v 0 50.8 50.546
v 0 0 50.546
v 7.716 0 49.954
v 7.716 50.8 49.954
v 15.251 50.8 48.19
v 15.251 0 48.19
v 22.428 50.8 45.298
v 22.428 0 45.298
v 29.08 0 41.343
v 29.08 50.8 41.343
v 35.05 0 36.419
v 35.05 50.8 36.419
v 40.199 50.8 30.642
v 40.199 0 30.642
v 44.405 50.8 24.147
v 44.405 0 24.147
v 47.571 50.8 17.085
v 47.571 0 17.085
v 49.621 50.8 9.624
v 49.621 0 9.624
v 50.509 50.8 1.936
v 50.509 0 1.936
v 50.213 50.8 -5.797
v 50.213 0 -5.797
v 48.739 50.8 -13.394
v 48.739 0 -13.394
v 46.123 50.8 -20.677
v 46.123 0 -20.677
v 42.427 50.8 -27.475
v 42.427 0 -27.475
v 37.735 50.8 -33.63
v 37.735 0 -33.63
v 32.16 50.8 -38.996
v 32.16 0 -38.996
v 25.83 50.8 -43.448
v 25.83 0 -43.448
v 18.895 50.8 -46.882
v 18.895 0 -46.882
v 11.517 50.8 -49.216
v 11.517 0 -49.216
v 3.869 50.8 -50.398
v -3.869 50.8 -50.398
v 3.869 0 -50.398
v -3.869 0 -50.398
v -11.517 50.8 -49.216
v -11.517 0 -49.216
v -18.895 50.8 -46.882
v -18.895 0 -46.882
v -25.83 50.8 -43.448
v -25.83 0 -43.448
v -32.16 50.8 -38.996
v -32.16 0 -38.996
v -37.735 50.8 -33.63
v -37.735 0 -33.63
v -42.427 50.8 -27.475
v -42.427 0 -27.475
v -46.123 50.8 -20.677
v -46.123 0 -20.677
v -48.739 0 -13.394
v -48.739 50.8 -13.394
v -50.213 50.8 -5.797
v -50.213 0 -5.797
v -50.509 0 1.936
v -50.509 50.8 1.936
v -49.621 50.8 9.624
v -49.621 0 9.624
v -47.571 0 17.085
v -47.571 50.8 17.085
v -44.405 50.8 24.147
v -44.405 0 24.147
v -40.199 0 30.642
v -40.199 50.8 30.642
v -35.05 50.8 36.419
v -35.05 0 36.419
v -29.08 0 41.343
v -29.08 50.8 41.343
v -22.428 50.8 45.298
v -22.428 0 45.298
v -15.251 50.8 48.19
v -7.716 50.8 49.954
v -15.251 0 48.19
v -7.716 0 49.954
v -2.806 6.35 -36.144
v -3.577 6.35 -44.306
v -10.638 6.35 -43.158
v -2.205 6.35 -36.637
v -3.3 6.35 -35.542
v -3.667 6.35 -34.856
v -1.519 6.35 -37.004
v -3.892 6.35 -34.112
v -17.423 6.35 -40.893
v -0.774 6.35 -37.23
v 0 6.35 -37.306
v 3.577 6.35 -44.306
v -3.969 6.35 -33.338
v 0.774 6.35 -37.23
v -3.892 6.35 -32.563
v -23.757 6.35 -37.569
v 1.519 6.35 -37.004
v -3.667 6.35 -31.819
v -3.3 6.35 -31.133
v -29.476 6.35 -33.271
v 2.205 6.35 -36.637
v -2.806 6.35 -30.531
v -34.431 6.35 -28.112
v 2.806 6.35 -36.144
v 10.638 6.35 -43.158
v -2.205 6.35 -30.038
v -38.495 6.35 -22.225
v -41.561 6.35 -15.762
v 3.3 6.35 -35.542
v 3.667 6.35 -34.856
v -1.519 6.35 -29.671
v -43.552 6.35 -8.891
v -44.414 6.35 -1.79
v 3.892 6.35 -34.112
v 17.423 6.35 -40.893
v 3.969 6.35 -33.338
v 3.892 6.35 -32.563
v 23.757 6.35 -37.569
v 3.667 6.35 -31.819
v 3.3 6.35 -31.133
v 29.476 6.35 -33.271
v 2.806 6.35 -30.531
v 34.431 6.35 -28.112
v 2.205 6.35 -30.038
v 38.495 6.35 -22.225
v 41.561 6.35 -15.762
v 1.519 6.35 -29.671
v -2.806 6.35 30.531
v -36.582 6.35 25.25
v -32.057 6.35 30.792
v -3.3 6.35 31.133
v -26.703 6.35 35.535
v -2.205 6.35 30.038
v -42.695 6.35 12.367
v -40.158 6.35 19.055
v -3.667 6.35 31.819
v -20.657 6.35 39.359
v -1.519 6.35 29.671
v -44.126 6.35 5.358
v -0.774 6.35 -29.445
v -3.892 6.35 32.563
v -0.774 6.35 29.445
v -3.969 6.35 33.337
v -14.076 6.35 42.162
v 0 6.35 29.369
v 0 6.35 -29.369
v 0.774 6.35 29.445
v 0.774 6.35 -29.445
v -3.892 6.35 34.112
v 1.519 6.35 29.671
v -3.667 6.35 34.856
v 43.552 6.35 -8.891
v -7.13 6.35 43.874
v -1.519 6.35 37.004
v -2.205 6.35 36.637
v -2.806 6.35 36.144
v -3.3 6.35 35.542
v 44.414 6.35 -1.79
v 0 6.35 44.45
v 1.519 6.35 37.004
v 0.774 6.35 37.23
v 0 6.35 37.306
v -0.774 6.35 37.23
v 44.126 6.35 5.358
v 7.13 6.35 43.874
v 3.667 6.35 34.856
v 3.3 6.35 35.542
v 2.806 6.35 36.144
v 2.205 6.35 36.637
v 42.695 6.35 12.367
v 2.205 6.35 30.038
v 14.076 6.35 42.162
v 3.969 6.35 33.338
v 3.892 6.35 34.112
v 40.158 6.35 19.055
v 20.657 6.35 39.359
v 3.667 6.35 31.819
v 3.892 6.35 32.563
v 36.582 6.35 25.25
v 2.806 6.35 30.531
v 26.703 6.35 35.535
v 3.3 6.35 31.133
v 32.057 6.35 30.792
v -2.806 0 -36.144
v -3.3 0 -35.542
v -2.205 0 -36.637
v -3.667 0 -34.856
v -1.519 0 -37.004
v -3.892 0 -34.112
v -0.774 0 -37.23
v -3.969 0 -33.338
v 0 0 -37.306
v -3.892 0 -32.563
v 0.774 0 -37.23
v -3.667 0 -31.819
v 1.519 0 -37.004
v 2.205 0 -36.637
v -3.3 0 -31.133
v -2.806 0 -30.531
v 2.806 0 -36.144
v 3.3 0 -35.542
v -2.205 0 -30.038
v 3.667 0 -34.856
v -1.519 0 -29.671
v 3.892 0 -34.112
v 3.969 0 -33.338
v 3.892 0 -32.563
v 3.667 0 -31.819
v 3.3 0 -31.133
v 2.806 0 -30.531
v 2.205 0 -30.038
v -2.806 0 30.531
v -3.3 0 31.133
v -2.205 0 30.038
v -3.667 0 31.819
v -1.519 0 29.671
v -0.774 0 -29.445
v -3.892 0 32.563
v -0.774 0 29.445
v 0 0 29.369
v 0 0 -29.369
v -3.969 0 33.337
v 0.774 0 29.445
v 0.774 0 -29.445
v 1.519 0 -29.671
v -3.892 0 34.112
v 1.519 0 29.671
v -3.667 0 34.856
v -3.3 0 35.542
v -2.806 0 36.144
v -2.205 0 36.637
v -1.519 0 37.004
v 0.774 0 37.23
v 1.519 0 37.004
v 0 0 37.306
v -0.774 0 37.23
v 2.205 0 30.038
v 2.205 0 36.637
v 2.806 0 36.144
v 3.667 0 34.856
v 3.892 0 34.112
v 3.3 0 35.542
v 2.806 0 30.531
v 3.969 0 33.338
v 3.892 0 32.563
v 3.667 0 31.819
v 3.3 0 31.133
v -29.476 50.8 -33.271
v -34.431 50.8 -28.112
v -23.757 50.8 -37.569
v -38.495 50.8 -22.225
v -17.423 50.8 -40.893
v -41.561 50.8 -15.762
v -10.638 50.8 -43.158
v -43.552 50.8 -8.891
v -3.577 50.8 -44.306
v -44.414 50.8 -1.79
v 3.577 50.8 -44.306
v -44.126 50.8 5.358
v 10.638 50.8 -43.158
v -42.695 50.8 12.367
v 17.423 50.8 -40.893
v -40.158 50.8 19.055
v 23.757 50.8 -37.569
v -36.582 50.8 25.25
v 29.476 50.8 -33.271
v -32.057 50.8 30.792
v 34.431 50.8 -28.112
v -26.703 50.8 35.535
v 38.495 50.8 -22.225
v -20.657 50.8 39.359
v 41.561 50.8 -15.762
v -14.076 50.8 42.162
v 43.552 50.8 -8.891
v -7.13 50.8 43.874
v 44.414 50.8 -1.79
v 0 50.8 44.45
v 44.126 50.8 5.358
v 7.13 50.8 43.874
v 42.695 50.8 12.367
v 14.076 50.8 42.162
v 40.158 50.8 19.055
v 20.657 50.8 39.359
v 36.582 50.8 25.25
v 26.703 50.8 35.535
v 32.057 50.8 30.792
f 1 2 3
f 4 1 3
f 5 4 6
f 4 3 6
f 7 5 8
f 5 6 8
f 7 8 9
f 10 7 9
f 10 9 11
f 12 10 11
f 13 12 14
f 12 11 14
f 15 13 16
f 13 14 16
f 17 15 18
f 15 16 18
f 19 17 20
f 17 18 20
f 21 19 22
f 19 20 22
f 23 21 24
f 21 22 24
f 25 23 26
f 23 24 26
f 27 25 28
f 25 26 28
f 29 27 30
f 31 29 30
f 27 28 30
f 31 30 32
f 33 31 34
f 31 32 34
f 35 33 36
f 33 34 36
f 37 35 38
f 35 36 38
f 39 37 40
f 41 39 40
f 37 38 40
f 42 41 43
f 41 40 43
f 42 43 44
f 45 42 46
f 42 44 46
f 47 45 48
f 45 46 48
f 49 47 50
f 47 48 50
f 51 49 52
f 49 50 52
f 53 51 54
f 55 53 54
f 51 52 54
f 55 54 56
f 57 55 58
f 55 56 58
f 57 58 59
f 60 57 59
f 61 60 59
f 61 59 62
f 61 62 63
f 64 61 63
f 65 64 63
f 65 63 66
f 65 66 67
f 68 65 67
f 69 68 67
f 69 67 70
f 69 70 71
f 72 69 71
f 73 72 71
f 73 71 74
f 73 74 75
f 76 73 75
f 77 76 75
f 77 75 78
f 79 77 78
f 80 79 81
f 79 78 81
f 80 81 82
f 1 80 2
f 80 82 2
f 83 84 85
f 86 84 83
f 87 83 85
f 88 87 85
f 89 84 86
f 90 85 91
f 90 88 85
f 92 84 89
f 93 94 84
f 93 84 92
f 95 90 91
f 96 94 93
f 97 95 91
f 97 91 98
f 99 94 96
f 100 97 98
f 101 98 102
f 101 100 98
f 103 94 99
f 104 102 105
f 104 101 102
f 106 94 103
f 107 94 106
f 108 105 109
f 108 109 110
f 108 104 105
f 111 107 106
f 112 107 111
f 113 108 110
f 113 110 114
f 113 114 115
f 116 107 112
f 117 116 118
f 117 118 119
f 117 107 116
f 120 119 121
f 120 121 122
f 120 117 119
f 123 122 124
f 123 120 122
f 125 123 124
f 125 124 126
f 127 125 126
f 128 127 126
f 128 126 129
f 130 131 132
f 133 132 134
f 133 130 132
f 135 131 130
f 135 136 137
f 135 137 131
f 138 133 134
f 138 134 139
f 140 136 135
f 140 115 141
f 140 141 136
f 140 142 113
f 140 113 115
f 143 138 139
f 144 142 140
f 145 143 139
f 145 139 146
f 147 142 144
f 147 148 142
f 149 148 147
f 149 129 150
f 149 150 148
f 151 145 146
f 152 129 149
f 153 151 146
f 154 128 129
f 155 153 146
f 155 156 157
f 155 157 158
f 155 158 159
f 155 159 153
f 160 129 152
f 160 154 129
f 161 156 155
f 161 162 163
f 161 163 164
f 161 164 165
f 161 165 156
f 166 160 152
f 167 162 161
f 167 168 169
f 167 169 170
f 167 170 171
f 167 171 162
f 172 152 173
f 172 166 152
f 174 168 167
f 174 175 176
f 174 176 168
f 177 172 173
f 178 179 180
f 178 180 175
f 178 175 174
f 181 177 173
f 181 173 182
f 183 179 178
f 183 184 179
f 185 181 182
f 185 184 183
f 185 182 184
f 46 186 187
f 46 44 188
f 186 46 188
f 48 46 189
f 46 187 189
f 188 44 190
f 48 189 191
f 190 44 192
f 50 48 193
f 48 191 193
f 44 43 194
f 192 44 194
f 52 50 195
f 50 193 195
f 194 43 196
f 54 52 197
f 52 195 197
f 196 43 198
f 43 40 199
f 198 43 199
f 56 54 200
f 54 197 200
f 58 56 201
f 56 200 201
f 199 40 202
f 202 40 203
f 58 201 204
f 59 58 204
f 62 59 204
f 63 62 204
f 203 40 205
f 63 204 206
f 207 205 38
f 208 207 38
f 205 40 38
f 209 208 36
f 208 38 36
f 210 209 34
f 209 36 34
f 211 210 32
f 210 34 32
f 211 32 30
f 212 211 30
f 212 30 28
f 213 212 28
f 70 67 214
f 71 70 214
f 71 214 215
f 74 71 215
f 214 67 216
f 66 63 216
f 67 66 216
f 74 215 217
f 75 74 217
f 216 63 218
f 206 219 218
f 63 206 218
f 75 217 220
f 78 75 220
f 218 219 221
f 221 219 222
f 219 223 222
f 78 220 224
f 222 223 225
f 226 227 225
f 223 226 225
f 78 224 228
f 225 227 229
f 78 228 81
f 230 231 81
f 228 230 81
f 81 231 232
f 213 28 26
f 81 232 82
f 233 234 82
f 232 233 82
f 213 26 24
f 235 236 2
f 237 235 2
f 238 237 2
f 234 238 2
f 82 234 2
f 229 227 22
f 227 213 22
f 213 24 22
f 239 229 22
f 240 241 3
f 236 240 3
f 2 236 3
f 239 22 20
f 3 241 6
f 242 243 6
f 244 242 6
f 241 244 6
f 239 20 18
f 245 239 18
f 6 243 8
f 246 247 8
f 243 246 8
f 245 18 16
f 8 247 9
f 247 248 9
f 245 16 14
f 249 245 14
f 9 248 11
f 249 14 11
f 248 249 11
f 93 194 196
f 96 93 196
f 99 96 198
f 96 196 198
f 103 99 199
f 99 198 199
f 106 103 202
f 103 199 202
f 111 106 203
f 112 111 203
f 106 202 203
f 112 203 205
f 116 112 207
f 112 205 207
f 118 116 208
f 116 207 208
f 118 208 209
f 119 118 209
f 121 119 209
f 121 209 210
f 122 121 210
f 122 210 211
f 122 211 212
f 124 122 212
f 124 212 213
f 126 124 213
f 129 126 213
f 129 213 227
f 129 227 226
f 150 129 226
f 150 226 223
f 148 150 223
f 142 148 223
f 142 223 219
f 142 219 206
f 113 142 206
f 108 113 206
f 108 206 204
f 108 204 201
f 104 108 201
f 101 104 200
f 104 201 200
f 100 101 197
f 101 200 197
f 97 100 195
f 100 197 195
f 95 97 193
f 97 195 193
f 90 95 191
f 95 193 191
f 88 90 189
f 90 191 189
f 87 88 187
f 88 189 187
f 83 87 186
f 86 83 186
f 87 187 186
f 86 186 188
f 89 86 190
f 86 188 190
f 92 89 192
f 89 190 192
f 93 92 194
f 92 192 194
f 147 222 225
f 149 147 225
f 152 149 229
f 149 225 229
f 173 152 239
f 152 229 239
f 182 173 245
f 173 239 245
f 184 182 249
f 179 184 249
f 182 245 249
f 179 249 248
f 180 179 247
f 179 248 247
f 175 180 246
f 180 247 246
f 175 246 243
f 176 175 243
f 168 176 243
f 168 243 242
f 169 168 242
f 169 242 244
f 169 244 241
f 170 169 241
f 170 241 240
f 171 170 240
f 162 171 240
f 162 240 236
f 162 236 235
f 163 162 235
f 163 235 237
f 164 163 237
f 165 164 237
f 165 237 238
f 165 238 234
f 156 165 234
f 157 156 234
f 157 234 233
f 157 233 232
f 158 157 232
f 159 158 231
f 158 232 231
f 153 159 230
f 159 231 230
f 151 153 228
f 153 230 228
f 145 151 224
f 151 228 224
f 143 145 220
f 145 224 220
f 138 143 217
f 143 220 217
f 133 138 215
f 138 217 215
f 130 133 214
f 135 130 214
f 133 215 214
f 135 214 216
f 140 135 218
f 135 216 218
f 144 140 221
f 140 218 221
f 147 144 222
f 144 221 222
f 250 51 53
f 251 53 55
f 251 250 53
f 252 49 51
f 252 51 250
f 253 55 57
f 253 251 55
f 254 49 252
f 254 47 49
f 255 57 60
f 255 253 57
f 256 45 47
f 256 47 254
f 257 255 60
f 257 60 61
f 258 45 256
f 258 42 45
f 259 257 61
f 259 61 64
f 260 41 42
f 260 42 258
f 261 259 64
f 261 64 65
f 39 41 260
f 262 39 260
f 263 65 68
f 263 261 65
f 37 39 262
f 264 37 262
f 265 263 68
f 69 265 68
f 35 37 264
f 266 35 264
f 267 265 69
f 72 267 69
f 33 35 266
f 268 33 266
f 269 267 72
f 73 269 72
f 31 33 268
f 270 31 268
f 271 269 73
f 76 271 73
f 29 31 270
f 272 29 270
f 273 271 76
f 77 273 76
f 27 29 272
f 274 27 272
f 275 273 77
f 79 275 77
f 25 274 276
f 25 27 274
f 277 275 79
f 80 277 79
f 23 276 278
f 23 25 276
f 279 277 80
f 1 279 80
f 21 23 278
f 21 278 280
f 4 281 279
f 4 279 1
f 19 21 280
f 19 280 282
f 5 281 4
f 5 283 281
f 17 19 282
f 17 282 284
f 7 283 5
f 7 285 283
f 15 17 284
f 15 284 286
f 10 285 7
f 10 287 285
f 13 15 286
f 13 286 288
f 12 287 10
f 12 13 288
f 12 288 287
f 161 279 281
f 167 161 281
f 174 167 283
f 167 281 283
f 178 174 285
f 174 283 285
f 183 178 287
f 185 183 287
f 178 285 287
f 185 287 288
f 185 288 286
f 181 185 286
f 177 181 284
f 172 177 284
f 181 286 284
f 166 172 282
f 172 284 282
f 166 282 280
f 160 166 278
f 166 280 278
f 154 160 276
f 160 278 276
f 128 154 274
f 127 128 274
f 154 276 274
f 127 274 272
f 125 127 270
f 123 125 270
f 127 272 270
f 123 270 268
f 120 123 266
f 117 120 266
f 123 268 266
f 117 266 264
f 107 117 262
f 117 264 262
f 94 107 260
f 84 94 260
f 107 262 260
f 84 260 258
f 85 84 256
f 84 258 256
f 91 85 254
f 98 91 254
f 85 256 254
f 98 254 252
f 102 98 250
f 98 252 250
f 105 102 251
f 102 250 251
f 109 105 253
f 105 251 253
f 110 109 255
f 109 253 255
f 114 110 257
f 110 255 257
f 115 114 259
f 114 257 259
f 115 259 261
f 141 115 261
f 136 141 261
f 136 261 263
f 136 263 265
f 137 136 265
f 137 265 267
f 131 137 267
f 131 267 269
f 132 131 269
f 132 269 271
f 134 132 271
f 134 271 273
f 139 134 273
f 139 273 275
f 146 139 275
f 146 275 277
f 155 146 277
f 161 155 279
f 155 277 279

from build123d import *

# Parameters (mm, degrees)
SKETCH1_R           = 50.546
BOSS_EXTRUDE1_DEPTH = 50.8
SKETCH2_R           = 44.45
CUT_EXTRUDE1_DEPTH  = 44.45
SKETCH3_R           = 3.96875
CUT_EXTRUDE2_DEPTH  = 44.45


with BuildPart() as part:
    # Sketch1 → Boss-Extrude1 (new body)
    with BuildSketch(Plane(origin=(0, 0, 0), x_dir=(1, 0, 0), z_dir=(0, 1, 0))):
        with Locations(Location((0, 0, 0), (0, 0, 270))):
            Circle(SKETCH1_R)
    extrude(amount=BOSS_EXTRUDE1_DEPTH)

    # Sketch2 → Cut-Extrude1 (cut)
    with BuildSketch(Plane(origin=(0, 50.8, 0), x_dir=(1, 0, 0), z_dir=(0, 1, 0))):
        with Locations(Location((0, 0, 0), (0, 0, 270))):
            Circle(SKETCH2_R)
    extrude(amount=-CUT_EXTRUDE1_DEPTH, mode=Mode.SUBTRACT)

    # Sketch3 → Cut-Extrude2 (cut)
    with BuildSketch(Plane.XZ):
        with Locations(Location((0, 33.3375, 0), (0, 0, 270))):
            Circle(SKETCH3_R)
        with Locations(Location((0, -33.3375, 0), (0, 0, 270))):
            Circle(SKETCH3_R)
    extrude(amount=-CUT_EXTRUDE2_DEPTH, mode=Mode.SUBTRACT)


solid = part.part
